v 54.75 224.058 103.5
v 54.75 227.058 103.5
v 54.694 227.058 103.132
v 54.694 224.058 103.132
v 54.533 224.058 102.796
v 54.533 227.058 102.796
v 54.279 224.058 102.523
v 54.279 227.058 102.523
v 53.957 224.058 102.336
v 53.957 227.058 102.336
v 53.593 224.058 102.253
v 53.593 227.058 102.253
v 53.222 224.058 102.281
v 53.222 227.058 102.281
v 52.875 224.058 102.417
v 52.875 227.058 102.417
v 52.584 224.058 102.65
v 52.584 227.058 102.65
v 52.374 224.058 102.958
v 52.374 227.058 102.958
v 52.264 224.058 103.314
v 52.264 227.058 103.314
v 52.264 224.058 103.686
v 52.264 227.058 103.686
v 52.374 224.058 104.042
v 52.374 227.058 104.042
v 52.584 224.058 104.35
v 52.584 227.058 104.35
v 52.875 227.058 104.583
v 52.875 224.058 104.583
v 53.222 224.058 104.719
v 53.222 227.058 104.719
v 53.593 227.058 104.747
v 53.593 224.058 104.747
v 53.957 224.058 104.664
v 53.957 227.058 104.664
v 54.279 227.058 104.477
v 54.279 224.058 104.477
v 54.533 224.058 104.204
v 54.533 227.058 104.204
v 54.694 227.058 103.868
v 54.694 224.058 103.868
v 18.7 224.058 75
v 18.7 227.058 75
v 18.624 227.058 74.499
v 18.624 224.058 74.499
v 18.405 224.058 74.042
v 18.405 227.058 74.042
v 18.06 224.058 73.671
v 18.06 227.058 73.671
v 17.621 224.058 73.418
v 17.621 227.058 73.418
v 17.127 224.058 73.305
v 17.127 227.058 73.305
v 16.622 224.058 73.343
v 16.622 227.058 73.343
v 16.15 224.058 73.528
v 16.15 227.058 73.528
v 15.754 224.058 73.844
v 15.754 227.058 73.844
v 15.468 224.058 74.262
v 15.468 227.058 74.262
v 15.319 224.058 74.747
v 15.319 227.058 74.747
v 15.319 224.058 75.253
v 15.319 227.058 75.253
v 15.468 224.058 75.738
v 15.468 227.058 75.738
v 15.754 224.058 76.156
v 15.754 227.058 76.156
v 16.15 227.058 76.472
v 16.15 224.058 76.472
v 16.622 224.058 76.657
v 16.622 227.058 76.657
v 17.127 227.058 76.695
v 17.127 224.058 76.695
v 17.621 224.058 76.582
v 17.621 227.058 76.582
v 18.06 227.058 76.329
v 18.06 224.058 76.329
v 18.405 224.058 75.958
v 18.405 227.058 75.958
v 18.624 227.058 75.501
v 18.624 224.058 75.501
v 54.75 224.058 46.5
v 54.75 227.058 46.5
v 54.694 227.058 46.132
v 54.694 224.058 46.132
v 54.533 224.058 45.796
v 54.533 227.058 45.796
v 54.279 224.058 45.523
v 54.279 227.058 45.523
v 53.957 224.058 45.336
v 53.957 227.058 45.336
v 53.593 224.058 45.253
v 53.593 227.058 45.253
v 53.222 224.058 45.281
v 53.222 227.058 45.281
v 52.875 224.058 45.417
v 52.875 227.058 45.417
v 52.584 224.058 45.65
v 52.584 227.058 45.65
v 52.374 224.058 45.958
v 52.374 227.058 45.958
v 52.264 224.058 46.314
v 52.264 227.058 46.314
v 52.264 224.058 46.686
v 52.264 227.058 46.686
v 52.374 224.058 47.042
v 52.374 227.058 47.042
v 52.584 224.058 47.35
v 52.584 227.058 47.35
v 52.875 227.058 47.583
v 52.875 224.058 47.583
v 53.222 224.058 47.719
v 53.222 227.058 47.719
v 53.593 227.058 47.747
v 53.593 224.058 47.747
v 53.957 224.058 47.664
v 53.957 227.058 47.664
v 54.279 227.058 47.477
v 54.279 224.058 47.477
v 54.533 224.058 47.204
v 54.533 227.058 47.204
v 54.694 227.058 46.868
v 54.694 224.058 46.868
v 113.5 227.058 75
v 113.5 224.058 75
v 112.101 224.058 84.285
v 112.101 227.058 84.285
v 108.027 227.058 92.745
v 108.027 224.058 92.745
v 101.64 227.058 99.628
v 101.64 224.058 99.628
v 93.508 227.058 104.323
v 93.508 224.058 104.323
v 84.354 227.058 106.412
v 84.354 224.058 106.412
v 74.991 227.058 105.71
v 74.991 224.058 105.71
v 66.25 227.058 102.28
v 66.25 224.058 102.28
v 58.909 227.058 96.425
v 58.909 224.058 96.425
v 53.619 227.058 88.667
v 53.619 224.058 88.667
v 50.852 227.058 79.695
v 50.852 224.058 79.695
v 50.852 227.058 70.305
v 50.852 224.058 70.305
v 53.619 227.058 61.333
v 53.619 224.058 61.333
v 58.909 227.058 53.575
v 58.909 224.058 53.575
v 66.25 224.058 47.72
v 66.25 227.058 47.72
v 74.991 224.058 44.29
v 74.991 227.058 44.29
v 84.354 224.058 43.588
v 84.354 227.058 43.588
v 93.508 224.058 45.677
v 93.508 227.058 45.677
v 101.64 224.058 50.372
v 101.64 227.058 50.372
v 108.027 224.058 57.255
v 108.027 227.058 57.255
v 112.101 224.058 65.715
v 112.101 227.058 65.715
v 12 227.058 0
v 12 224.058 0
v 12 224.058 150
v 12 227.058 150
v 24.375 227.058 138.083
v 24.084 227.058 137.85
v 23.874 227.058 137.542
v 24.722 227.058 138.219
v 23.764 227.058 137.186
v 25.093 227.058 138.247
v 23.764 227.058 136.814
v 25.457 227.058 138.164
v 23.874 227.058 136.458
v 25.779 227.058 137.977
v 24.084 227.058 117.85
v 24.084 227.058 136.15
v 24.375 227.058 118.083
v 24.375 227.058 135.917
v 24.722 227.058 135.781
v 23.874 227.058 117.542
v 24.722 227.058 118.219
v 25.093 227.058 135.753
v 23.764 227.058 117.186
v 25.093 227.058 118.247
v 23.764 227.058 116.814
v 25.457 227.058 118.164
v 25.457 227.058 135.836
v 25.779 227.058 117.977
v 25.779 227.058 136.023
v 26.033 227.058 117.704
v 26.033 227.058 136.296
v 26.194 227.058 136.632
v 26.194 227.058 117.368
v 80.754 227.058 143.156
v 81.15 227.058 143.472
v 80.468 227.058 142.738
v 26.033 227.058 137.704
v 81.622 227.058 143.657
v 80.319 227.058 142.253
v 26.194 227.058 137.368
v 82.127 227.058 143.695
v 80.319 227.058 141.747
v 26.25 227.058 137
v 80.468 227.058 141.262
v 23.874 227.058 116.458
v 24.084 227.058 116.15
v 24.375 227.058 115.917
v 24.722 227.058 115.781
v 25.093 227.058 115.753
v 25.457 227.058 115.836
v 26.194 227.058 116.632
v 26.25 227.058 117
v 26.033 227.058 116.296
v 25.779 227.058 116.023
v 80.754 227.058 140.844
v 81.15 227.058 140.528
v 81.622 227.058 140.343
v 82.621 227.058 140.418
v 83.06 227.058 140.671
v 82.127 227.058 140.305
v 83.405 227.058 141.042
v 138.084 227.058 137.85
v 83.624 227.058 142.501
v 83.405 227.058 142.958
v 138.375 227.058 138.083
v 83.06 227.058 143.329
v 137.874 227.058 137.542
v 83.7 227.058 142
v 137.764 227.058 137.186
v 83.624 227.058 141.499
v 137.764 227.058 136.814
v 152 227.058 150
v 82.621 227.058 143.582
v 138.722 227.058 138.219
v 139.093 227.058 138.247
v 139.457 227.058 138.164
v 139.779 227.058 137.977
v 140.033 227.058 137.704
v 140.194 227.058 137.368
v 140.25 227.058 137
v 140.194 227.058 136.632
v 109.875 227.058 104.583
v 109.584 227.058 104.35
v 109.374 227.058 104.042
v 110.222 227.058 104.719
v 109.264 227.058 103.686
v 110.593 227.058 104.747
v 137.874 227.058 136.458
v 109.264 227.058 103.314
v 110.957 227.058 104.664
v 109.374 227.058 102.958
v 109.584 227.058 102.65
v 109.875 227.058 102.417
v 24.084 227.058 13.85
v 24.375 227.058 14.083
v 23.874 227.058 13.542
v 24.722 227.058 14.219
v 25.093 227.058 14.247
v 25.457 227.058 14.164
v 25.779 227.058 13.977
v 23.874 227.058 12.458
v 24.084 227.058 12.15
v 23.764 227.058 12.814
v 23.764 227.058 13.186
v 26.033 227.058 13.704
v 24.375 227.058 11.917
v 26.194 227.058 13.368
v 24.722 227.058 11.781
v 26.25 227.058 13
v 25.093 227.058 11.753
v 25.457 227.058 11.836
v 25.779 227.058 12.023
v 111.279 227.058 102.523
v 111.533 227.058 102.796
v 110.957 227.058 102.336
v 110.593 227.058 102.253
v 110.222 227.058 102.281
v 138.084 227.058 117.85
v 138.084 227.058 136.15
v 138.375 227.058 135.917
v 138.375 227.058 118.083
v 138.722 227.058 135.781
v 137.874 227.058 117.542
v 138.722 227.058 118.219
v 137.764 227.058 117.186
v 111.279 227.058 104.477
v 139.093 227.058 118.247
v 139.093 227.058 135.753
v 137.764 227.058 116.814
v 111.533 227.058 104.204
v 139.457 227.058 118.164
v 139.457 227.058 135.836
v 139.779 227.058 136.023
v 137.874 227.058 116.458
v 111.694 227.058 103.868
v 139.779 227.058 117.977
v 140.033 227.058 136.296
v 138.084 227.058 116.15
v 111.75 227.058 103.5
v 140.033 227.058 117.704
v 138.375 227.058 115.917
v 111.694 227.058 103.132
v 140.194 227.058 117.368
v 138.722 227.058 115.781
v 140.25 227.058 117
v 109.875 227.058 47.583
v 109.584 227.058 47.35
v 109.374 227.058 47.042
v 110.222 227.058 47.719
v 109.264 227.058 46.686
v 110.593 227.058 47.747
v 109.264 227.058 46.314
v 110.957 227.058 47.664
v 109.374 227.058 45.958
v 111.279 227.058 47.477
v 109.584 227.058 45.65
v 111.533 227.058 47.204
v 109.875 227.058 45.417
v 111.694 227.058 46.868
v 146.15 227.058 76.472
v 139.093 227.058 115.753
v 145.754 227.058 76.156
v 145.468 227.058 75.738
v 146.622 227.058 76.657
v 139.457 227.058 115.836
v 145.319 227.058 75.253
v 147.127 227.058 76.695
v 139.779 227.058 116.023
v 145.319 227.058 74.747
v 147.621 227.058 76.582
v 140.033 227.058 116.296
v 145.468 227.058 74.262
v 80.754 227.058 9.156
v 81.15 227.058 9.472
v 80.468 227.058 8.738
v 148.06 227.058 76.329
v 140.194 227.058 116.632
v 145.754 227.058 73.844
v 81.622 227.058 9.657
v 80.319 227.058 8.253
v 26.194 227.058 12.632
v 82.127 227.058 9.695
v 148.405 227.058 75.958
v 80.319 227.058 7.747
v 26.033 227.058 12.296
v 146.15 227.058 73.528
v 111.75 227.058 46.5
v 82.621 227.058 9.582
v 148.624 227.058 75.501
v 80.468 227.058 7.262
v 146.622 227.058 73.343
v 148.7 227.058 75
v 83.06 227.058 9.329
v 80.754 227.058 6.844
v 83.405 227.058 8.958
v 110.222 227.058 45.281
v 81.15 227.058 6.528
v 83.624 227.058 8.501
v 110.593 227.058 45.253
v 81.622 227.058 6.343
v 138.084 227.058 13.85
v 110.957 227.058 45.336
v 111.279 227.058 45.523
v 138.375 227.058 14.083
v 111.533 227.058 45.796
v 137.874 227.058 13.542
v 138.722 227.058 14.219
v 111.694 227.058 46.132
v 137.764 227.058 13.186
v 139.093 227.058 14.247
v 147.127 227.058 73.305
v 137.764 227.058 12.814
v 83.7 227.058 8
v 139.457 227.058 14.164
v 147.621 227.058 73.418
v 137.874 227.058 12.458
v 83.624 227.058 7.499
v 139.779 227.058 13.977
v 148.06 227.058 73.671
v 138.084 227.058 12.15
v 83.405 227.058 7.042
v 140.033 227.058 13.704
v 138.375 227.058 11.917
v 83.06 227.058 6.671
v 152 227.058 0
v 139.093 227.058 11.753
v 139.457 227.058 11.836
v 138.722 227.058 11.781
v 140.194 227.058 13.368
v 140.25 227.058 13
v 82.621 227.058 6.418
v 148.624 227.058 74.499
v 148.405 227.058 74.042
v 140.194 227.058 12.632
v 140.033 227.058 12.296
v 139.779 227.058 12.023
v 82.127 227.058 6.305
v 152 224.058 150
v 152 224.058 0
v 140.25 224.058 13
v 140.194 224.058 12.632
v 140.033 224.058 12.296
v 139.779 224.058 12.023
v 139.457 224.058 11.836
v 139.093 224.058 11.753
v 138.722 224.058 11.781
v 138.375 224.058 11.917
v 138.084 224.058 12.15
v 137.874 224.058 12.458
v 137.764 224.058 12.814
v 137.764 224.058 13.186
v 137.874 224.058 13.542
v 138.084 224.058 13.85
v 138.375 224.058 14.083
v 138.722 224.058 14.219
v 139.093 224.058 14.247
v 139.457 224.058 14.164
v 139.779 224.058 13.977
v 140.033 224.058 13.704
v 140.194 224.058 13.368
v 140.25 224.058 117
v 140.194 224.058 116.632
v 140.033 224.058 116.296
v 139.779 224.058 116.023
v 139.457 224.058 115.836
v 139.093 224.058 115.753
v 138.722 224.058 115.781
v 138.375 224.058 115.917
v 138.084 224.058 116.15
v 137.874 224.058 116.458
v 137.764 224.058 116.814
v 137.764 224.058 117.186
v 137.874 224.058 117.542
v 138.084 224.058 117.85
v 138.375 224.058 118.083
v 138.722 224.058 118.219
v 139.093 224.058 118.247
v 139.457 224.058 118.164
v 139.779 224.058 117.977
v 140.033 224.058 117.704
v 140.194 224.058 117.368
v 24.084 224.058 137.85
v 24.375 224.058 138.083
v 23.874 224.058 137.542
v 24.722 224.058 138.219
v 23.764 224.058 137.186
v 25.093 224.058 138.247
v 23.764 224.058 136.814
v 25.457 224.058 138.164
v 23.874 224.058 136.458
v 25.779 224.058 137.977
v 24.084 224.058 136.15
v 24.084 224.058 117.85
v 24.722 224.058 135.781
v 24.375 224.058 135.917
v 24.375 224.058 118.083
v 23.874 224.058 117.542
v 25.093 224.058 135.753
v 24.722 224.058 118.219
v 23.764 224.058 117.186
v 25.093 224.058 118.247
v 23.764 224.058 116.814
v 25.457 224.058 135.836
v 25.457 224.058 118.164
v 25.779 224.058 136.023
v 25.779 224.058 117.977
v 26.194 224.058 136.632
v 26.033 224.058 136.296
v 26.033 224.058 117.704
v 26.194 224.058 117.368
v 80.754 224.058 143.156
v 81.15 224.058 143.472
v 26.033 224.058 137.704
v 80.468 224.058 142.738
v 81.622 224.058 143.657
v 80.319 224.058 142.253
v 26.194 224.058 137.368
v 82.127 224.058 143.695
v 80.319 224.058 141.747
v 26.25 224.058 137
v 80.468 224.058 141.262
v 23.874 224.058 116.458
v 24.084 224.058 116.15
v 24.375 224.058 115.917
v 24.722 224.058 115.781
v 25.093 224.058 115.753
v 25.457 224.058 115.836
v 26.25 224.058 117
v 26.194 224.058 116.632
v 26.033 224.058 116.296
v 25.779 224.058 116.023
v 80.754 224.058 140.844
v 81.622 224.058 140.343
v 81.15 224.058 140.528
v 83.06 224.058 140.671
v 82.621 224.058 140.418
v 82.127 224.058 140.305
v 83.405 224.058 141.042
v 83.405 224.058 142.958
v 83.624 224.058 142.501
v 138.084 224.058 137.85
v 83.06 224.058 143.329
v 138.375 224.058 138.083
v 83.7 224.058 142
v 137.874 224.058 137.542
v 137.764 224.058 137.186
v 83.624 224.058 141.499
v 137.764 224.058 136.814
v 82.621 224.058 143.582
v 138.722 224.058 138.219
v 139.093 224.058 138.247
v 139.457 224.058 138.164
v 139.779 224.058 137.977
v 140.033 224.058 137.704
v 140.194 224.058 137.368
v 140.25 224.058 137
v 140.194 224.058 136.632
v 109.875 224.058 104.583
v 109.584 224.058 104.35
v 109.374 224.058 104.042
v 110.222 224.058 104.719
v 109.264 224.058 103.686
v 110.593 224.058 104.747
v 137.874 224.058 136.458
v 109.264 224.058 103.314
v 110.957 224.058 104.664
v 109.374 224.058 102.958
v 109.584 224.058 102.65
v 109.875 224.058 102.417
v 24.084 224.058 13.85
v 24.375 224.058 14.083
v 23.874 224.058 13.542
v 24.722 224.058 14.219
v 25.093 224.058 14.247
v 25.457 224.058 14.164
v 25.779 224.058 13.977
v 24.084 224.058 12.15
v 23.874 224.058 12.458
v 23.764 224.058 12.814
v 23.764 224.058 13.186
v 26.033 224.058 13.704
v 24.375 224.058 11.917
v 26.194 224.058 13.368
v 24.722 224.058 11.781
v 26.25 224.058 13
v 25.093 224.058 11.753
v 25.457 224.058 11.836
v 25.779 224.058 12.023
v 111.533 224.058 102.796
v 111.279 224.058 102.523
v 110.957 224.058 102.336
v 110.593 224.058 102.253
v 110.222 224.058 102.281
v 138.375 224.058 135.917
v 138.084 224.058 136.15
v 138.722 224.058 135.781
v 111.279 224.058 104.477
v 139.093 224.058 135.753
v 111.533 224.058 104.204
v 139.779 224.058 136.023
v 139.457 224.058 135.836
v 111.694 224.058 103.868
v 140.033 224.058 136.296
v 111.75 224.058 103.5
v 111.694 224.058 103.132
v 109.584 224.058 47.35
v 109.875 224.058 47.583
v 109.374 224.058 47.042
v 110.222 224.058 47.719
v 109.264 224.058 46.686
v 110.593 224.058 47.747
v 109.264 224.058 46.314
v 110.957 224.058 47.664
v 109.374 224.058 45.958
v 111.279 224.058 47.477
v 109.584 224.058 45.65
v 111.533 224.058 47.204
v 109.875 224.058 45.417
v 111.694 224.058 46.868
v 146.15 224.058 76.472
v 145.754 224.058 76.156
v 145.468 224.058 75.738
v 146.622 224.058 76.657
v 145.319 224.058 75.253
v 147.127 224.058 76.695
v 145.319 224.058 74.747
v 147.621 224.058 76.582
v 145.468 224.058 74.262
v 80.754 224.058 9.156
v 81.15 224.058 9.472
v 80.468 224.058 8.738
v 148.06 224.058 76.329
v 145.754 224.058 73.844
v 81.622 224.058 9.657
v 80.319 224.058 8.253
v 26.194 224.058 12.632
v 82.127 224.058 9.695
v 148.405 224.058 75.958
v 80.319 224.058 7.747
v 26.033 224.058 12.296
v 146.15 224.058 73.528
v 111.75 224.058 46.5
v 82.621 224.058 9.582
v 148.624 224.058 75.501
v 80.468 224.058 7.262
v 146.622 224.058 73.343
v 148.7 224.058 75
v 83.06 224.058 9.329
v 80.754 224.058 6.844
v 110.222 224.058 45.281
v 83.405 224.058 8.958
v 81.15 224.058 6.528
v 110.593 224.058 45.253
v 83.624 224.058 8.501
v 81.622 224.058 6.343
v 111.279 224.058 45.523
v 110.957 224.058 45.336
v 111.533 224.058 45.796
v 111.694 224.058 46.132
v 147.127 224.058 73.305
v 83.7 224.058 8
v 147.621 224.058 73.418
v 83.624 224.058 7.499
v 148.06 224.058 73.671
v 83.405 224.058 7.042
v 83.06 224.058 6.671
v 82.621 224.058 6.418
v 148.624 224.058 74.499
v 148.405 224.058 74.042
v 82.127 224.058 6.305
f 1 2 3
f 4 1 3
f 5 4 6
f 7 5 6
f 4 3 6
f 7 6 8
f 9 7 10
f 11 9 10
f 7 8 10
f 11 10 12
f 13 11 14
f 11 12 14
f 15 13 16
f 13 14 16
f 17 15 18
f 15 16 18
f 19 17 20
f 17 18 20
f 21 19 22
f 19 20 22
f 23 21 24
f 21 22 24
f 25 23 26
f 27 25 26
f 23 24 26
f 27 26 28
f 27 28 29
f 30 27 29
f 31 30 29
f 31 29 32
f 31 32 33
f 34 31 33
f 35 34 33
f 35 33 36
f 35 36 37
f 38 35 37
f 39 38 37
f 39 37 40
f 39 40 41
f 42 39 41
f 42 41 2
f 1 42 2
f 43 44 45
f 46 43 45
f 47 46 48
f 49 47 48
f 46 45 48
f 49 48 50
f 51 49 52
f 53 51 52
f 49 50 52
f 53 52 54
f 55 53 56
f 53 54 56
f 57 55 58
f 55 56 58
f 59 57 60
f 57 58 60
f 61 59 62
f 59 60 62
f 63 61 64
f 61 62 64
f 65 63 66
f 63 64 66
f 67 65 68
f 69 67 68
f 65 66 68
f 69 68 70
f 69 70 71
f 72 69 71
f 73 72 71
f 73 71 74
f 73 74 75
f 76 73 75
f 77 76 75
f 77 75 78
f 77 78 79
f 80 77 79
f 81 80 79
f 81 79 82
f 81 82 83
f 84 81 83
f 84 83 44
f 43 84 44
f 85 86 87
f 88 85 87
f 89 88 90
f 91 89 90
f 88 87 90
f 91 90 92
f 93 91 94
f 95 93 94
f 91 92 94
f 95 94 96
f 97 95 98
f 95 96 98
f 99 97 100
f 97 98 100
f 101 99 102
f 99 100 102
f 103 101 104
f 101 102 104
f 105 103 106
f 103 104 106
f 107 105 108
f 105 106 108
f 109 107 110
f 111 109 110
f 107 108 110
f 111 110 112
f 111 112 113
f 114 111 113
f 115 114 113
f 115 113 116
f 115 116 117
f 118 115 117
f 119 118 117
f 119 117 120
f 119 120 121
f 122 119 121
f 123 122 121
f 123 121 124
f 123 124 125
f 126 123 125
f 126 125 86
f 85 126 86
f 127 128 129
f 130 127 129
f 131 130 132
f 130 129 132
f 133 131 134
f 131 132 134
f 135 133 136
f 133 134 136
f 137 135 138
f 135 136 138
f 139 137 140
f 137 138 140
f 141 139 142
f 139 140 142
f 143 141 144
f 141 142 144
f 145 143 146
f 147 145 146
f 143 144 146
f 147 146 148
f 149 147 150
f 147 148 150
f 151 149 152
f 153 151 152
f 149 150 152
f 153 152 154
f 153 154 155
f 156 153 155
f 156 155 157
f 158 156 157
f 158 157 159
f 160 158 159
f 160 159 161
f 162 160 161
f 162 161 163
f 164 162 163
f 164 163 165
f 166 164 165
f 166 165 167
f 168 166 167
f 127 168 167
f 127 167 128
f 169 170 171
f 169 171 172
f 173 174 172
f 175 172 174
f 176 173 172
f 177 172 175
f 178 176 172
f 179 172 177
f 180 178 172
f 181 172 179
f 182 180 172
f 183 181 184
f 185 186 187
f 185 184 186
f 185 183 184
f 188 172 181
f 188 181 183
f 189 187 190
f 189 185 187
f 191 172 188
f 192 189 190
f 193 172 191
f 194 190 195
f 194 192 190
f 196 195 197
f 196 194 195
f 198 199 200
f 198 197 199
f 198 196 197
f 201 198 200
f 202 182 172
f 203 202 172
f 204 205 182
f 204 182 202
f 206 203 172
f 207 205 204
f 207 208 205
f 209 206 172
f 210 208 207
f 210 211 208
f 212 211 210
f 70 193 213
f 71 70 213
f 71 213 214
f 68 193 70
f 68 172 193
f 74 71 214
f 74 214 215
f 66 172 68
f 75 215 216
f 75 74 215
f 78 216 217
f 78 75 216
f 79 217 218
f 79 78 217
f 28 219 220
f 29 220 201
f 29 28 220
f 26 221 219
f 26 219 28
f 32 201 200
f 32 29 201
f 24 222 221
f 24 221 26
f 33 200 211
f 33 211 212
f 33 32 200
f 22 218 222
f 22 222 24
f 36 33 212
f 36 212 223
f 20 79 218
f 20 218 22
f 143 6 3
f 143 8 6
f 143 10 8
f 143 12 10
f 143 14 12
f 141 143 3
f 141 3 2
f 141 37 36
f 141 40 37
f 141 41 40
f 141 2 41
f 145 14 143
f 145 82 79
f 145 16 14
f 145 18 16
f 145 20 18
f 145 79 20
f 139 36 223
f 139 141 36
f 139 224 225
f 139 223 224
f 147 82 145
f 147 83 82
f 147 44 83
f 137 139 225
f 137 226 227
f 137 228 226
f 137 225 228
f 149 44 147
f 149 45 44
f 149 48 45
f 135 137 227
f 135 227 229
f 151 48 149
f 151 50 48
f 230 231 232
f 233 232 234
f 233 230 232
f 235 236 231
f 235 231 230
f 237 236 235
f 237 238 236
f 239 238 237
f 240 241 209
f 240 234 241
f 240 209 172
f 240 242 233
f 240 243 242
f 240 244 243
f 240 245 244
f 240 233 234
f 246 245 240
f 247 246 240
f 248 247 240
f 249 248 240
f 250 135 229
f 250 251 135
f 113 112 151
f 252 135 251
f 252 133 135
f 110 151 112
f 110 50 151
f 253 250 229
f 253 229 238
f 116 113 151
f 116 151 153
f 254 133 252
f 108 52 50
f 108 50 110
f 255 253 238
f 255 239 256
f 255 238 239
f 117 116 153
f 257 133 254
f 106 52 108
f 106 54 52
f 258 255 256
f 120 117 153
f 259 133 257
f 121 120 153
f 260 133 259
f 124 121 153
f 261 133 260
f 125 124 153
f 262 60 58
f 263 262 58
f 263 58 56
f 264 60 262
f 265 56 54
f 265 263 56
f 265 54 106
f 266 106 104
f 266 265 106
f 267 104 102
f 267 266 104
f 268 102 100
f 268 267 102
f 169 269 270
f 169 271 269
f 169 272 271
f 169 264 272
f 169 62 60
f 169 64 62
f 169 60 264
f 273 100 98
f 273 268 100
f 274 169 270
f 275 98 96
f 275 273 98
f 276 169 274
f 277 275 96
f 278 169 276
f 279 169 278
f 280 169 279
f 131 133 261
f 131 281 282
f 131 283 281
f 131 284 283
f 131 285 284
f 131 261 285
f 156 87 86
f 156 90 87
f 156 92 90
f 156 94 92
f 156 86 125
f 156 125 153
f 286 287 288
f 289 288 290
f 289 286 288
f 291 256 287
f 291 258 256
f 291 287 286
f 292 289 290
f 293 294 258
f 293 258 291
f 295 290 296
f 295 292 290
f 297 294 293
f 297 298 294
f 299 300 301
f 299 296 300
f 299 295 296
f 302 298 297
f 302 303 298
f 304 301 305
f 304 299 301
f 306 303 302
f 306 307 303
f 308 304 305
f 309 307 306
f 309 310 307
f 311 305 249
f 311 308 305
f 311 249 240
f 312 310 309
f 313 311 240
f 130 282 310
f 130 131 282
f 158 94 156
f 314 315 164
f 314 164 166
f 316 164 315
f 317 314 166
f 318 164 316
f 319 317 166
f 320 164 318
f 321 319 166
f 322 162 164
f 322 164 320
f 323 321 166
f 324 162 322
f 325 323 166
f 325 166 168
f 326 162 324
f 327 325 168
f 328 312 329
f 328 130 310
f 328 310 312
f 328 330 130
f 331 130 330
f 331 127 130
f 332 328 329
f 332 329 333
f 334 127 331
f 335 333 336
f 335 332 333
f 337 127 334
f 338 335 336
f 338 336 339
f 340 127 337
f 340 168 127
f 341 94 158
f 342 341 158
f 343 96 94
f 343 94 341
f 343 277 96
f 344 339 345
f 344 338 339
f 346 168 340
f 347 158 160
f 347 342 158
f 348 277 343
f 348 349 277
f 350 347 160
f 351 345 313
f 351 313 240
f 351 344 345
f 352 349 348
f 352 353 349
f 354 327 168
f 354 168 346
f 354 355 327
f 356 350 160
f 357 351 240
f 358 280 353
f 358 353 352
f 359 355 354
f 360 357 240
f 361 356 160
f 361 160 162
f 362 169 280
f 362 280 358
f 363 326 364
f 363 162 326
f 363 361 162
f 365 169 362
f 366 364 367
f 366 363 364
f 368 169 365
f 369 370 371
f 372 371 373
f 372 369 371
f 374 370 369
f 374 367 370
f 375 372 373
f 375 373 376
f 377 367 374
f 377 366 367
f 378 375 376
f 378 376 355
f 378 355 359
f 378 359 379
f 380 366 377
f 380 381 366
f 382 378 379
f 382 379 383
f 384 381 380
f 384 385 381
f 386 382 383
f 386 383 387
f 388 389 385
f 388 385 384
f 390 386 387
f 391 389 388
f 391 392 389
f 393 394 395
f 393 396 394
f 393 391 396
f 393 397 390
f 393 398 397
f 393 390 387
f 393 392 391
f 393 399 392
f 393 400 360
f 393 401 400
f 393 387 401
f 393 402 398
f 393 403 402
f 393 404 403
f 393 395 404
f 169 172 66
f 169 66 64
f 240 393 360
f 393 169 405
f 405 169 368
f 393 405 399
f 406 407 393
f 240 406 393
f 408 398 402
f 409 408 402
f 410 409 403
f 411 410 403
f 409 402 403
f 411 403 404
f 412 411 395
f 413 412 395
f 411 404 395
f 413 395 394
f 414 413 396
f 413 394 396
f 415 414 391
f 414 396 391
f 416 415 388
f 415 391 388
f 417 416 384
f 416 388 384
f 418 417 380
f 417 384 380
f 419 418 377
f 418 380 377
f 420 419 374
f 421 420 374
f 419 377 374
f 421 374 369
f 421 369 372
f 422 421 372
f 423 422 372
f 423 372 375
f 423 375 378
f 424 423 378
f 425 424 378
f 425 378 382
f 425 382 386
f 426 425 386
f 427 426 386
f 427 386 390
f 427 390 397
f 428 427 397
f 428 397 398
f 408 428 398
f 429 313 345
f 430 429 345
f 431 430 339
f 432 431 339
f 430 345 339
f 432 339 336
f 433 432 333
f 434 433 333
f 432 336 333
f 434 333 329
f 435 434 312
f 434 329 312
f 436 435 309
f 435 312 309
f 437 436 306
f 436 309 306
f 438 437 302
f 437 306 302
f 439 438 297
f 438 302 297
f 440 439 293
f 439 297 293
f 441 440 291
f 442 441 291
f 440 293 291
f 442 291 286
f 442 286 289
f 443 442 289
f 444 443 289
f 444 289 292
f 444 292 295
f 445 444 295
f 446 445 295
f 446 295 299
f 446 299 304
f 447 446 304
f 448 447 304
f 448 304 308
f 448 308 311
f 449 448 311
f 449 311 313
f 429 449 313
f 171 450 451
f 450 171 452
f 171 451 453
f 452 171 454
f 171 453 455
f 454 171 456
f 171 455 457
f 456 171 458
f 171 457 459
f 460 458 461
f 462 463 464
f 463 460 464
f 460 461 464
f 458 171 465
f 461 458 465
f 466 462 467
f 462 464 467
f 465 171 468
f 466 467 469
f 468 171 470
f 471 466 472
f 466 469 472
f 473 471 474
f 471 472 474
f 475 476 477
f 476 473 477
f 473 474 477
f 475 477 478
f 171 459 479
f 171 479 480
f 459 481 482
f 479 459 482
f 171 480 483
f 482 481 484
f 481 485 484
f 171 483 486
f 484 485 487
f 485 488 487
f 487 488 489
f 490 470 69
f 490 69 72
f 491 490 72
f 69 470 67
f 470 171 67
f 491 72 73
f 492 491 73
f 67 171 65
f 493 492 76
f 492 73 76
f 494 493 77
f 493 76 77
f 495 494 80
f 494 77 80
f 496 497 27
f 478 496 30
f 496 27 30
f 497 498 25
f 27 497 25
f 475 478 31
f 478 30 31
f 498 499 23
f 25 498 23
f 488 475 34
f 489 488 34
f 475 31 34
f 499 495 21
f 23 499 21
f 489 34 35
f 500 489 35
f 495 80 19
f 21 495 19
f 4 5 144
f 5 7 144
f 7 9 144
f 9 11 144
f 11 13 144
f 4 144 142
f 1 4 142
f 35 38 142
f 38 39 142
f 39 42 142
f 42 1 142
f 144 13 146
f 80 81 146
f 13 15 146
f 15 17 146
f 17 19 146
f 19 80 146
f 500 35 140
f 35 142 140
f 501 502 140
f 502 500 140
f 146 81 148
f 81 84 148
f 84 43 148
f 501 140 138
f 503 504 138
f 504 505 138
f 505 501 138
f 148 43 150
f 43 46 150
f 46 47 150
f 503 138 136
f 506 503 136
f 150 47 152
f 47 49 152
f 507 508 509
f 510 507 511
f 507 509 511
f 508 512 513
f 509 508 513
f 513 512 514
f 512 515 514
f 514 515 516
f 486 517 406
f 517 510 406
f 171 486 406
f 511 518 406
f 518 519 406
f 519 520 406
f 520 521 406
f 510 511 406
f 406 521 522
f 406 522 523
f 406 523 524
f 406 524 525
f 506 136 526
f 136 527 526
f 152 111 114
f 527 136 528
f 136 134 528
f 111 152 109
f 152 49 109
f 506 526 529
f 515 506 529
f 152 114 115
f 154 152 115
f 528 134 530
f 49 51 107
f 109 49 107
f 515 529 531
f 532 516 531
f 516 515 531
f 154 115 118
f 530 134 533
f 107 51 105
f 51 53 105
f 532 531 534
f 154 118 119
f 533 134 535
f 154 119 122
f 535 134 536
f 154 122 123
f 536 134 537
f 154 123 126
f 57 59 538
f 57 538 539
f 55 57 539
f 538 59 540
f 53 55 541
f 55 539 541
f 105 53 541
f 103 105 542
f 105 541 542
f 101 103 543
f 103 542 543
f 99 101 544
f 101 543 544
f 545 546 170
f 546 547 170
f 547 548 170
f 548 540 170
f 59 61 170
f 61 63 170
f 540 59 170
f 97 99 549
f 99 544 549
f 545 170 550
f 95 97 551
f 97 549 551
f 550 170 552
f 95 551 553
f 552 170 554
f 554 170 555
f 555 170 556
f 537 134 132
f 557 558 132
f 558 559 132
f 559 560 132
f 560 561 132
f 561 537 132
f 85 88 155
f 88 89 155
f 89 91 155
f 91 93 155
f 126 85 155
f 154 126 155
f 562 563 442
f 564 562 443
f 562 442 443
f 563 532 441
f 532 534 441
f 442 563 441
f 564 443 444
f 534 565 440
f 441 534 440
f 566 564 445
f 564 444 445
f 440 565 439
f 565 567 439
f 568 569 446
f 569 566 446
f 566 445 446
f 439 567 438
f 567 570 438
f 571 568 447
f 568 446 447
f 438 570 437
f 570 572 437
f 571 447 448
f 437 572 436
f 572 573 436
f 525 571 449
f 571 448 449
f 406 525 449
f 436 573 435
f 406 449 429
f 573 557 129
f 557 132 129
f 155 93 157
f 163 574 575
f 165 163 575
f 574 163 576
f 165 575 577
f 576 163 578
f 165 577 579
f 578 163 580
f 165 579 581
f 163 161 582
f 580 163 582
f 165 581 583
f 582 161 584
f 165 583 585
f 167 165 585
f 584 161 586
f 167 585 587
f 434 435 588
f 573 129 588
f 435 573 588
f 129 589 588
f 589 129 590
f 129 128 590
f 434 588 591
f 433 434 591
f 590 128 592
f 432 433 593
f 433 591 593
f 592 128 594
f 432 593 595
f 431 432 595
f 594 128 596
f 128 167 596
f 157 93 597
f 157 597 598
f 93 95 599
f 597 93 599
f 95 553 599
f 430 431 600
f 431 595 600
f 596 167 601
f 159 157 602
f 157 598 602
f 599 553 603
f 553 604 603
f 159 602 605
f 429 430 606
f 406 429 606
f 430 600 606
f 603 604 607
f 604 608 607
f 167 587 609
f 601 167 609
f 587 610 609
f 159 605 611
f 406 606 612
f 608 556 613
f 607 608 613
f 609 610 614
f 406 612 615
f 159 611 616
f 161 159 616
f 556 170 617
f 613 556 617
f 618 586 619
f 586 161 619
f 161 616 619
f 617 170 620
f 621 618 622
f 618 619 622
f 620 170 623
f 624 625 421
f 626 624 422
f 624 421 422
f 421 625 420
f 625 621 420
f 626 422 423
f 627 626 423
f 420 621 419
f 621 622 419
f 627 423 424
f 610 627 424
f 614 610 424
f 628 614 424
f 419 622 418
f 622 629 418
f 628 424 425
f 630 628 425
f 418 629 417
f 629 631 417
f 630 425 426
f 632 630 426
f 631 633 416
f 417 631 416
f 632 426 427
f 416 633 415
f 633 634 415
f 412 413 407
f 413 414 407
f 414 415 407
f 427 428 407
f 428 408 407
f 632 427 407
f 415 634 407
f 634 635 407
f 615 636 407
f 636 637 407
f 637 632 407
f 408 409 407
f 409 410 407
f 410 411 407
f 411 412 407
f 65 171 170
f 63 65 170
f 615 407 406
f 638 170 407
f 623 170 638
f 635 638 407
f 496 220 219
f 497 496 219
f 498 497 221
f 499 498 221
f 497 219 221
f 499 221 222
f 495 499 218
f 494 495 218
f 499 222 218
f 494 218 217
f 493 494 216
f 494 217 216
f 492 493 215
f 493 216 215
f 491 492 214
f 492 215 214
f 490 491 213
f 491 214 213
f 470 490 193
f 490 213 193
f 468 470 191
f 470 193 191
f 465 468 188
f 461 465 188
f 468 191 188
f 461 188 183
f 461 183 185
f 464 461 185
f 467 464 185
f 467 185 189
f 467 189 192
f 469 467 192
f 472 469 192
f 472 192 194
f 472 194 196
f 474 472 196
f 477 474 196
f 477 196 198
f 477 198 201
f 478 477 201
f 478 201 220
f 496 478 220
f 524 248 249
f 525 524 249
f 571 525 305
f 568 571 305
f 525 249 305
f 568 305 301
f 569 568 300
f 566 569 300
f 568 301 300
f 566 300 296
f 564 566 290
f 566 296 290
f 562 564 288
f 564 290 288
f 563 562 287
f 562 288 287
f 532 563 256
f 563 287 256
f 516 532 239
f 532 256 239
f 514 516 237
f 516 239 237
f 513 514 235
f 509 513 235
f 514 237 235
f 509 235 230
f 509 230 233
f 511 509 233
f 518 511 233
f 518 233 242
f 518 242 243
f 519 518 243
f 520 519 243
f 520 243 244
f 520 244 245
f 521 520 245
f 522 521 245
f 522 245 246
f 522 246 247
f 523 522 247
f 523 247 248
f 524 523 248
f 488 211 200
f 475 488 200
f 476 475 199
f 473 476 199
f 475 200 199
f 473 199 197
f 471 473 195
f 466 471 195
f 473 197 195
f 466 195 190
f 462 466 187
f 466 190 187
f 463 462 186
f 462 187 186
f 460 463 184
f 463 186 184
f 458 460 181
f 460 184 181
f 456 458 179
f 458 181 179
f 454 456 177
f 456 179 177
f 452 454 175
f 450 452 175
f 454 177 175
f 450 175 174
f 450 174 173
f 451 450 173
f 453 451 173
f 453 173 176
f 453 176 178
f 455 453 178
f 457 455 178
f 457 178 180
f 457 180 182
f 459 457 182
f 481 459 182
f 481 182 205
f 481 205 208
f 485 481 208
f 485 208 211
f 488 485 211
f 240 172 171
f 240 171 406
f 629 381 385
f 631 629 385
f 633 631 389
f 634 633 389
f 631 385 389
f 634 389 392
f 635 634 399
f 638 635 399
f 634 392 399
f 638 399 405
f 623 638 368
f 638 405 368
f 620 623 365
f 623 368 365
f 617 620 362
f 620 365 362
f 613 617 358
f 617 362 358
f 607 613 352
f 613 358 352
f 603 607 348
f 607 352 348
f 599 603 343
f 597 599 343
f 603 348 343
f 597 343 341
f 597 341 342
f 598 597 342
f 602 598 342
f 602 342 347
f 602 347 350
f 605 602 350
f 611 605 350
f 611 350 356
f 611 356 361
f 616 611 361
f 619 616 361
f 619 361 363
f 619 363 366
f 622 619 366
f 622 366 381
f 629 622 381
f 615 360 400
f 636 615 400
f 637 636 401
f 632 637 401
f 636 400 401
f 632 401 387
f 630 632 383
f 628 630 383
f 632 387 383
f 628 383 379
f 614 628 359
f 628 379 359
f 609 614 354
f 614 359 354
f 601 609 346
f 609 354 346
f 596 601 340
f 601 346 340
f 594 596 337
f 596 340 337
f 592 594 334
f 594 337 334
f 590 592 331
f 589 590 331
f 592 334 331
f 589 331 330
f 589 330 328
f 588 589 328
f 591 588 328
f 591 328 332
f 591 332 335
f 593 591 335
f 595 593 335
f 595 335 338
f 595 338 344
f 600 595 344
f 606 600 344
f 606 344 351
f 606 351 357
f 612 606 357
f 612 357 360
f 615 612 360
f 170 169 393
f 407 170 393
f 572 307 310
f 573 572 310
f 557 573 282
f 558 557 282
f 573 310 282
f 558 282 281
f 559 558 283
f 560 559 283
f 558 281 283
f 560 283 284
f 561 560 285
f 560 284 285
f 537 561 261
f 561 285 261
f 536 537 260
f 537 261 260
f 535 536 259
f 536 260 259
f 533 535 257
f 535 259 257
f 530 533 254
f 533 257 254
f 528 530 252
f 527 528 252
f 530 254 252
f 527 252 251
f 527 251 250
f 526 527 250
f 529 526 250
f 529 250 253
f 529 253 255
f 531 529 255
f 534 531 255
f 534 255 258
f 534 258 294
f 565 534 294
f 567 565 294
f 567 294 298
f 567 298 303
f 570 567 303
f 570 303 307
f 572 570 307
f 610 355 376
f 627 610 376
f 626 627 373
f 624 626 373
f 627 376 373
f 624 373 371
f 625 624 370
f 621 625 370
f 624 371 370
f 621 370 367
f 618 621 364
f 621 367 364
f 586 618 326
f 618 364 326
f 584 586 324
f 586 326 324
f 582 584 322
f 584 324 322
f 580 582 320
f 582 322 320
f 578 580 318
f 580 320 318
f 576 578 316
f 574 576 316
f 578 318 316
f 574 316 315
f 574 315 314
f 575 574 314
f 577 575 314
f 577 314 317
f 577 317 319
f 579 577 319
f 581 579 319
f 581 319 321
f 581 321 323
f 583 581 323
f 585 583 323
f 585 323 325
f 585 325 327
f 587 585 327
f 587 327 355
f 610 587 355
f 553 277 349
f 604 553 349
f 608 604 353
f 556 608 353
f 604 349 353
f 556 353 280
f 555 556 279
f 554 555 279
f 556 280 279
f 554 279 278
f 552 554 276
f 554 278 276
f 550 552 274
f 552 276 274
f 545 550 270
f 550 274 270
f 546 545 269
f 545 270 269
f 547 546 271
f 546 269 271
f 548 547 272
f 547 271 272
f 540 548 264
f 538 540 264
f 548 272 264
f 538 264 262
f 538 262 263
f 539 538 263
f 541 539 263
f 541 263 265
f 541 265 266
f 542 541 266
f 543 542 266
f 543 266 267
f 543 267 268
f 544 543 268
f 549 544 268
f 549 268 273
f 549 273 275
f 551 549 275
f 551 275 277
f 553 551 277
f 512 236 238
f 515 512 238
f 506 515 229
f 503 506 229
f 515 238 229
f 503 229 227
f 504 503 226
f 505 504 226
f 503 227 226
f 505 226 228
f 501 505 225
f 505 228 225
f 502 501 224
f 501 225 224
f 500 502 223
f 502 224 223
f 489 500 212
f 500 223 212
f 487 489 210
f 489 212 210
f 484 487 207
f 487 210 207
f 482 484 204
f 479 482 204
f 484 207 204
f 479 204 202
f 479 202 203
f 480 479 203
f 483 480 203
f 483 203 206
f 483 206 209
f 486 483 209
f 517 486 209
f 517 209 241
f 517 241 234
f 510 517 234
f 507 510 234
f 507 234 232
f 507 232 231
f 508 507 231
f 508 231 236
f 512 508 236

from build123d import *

# Parameters (mm, degrees)
SKETCH_1_W           = 140
SKETCH_1_H           = 3
EXTRUDE_1_DEPTH      = 150
CUT_EXTRUDE_1_REACH  = 5
SKETCH_2_R           = 31.5
HOLE_WIZARD_M3_1_D   = 2.5
HOLE_WIZARD_M3_1_2_D = 3.4
HOLE_WIZARD_M3_2_D   = 2.5


with BuildPart() as part:
    # 草图1 → 拉伸-薄壁1 (new body)
    with BuildSketch(Plane.XY):
        with Locations((82, 225.557982809)):
            Rectangle(SKETCH_1_W, SKETCH_1_H)
    extrude(amount=EXTRUDE_1_DEPTH)

    # 草图2 → 切除-拉伸1 (cut, up to next)
    with BuildSketch(Plane.XZ.offset(-224.057982809), mode=Mode.PRIVATE) as cut_extrude_1_sk1:
        with Locations((82, 75)):
            Circle(SKETCH_2_R)
    cut_extrude_1_tool1 = extrude(cut_extrude_1_sk1.sketch, amount=-CUT_EXTRUDE_1_REACH, mode=Mode.PRIVATE) & part.part
    add(cut_extrude_1_tool1.solids().sort_by_distance((82, 224.057983, 75))[0], mode=Mode.SUBTRACT)

    # Hole Wizard M3 _1 (through all)
    with Locations(Plane(origin=(0, 224.057982809, 0), x_dir=(-1, 0, 0), z_dir=(0, -1, 0))):
        with Locations((-53.5, -103.5), (-53.5, -46.5), (-110.5, -46.5), (-110.5, -103.5)):
            Hole(HOLE_WIZARD_M3_1_D / 2)

    # Hole Wizard M3 _1 2 (through all)
    with Locations(Plane(origin=(0, 224.057982809, 0), x_dir=(-1, 0, 0), z_dir=(0, -1, 0))):
        with Locations((-82, -142), (-147, -75), (-82, -8), (-17, -75)):
            Hole(HOLE_WIZARD_M3_1_2_D / 2)

    # M3 螺纹孔的螺纹孔钻头2 (through all)
    with Locations(Plane(origin=(0, 224.057982809, 0), x_dir=(-1, 0, 0), z_dir=(0, -1, 0))):
        with Locations((-139, -137), (-139, -117), (-139, -13), (-25, -137), (-25, -117), (-25, -13)):
            Hole(HOLE_WIZARD_M3_2_D / 2)


solid = part.part
